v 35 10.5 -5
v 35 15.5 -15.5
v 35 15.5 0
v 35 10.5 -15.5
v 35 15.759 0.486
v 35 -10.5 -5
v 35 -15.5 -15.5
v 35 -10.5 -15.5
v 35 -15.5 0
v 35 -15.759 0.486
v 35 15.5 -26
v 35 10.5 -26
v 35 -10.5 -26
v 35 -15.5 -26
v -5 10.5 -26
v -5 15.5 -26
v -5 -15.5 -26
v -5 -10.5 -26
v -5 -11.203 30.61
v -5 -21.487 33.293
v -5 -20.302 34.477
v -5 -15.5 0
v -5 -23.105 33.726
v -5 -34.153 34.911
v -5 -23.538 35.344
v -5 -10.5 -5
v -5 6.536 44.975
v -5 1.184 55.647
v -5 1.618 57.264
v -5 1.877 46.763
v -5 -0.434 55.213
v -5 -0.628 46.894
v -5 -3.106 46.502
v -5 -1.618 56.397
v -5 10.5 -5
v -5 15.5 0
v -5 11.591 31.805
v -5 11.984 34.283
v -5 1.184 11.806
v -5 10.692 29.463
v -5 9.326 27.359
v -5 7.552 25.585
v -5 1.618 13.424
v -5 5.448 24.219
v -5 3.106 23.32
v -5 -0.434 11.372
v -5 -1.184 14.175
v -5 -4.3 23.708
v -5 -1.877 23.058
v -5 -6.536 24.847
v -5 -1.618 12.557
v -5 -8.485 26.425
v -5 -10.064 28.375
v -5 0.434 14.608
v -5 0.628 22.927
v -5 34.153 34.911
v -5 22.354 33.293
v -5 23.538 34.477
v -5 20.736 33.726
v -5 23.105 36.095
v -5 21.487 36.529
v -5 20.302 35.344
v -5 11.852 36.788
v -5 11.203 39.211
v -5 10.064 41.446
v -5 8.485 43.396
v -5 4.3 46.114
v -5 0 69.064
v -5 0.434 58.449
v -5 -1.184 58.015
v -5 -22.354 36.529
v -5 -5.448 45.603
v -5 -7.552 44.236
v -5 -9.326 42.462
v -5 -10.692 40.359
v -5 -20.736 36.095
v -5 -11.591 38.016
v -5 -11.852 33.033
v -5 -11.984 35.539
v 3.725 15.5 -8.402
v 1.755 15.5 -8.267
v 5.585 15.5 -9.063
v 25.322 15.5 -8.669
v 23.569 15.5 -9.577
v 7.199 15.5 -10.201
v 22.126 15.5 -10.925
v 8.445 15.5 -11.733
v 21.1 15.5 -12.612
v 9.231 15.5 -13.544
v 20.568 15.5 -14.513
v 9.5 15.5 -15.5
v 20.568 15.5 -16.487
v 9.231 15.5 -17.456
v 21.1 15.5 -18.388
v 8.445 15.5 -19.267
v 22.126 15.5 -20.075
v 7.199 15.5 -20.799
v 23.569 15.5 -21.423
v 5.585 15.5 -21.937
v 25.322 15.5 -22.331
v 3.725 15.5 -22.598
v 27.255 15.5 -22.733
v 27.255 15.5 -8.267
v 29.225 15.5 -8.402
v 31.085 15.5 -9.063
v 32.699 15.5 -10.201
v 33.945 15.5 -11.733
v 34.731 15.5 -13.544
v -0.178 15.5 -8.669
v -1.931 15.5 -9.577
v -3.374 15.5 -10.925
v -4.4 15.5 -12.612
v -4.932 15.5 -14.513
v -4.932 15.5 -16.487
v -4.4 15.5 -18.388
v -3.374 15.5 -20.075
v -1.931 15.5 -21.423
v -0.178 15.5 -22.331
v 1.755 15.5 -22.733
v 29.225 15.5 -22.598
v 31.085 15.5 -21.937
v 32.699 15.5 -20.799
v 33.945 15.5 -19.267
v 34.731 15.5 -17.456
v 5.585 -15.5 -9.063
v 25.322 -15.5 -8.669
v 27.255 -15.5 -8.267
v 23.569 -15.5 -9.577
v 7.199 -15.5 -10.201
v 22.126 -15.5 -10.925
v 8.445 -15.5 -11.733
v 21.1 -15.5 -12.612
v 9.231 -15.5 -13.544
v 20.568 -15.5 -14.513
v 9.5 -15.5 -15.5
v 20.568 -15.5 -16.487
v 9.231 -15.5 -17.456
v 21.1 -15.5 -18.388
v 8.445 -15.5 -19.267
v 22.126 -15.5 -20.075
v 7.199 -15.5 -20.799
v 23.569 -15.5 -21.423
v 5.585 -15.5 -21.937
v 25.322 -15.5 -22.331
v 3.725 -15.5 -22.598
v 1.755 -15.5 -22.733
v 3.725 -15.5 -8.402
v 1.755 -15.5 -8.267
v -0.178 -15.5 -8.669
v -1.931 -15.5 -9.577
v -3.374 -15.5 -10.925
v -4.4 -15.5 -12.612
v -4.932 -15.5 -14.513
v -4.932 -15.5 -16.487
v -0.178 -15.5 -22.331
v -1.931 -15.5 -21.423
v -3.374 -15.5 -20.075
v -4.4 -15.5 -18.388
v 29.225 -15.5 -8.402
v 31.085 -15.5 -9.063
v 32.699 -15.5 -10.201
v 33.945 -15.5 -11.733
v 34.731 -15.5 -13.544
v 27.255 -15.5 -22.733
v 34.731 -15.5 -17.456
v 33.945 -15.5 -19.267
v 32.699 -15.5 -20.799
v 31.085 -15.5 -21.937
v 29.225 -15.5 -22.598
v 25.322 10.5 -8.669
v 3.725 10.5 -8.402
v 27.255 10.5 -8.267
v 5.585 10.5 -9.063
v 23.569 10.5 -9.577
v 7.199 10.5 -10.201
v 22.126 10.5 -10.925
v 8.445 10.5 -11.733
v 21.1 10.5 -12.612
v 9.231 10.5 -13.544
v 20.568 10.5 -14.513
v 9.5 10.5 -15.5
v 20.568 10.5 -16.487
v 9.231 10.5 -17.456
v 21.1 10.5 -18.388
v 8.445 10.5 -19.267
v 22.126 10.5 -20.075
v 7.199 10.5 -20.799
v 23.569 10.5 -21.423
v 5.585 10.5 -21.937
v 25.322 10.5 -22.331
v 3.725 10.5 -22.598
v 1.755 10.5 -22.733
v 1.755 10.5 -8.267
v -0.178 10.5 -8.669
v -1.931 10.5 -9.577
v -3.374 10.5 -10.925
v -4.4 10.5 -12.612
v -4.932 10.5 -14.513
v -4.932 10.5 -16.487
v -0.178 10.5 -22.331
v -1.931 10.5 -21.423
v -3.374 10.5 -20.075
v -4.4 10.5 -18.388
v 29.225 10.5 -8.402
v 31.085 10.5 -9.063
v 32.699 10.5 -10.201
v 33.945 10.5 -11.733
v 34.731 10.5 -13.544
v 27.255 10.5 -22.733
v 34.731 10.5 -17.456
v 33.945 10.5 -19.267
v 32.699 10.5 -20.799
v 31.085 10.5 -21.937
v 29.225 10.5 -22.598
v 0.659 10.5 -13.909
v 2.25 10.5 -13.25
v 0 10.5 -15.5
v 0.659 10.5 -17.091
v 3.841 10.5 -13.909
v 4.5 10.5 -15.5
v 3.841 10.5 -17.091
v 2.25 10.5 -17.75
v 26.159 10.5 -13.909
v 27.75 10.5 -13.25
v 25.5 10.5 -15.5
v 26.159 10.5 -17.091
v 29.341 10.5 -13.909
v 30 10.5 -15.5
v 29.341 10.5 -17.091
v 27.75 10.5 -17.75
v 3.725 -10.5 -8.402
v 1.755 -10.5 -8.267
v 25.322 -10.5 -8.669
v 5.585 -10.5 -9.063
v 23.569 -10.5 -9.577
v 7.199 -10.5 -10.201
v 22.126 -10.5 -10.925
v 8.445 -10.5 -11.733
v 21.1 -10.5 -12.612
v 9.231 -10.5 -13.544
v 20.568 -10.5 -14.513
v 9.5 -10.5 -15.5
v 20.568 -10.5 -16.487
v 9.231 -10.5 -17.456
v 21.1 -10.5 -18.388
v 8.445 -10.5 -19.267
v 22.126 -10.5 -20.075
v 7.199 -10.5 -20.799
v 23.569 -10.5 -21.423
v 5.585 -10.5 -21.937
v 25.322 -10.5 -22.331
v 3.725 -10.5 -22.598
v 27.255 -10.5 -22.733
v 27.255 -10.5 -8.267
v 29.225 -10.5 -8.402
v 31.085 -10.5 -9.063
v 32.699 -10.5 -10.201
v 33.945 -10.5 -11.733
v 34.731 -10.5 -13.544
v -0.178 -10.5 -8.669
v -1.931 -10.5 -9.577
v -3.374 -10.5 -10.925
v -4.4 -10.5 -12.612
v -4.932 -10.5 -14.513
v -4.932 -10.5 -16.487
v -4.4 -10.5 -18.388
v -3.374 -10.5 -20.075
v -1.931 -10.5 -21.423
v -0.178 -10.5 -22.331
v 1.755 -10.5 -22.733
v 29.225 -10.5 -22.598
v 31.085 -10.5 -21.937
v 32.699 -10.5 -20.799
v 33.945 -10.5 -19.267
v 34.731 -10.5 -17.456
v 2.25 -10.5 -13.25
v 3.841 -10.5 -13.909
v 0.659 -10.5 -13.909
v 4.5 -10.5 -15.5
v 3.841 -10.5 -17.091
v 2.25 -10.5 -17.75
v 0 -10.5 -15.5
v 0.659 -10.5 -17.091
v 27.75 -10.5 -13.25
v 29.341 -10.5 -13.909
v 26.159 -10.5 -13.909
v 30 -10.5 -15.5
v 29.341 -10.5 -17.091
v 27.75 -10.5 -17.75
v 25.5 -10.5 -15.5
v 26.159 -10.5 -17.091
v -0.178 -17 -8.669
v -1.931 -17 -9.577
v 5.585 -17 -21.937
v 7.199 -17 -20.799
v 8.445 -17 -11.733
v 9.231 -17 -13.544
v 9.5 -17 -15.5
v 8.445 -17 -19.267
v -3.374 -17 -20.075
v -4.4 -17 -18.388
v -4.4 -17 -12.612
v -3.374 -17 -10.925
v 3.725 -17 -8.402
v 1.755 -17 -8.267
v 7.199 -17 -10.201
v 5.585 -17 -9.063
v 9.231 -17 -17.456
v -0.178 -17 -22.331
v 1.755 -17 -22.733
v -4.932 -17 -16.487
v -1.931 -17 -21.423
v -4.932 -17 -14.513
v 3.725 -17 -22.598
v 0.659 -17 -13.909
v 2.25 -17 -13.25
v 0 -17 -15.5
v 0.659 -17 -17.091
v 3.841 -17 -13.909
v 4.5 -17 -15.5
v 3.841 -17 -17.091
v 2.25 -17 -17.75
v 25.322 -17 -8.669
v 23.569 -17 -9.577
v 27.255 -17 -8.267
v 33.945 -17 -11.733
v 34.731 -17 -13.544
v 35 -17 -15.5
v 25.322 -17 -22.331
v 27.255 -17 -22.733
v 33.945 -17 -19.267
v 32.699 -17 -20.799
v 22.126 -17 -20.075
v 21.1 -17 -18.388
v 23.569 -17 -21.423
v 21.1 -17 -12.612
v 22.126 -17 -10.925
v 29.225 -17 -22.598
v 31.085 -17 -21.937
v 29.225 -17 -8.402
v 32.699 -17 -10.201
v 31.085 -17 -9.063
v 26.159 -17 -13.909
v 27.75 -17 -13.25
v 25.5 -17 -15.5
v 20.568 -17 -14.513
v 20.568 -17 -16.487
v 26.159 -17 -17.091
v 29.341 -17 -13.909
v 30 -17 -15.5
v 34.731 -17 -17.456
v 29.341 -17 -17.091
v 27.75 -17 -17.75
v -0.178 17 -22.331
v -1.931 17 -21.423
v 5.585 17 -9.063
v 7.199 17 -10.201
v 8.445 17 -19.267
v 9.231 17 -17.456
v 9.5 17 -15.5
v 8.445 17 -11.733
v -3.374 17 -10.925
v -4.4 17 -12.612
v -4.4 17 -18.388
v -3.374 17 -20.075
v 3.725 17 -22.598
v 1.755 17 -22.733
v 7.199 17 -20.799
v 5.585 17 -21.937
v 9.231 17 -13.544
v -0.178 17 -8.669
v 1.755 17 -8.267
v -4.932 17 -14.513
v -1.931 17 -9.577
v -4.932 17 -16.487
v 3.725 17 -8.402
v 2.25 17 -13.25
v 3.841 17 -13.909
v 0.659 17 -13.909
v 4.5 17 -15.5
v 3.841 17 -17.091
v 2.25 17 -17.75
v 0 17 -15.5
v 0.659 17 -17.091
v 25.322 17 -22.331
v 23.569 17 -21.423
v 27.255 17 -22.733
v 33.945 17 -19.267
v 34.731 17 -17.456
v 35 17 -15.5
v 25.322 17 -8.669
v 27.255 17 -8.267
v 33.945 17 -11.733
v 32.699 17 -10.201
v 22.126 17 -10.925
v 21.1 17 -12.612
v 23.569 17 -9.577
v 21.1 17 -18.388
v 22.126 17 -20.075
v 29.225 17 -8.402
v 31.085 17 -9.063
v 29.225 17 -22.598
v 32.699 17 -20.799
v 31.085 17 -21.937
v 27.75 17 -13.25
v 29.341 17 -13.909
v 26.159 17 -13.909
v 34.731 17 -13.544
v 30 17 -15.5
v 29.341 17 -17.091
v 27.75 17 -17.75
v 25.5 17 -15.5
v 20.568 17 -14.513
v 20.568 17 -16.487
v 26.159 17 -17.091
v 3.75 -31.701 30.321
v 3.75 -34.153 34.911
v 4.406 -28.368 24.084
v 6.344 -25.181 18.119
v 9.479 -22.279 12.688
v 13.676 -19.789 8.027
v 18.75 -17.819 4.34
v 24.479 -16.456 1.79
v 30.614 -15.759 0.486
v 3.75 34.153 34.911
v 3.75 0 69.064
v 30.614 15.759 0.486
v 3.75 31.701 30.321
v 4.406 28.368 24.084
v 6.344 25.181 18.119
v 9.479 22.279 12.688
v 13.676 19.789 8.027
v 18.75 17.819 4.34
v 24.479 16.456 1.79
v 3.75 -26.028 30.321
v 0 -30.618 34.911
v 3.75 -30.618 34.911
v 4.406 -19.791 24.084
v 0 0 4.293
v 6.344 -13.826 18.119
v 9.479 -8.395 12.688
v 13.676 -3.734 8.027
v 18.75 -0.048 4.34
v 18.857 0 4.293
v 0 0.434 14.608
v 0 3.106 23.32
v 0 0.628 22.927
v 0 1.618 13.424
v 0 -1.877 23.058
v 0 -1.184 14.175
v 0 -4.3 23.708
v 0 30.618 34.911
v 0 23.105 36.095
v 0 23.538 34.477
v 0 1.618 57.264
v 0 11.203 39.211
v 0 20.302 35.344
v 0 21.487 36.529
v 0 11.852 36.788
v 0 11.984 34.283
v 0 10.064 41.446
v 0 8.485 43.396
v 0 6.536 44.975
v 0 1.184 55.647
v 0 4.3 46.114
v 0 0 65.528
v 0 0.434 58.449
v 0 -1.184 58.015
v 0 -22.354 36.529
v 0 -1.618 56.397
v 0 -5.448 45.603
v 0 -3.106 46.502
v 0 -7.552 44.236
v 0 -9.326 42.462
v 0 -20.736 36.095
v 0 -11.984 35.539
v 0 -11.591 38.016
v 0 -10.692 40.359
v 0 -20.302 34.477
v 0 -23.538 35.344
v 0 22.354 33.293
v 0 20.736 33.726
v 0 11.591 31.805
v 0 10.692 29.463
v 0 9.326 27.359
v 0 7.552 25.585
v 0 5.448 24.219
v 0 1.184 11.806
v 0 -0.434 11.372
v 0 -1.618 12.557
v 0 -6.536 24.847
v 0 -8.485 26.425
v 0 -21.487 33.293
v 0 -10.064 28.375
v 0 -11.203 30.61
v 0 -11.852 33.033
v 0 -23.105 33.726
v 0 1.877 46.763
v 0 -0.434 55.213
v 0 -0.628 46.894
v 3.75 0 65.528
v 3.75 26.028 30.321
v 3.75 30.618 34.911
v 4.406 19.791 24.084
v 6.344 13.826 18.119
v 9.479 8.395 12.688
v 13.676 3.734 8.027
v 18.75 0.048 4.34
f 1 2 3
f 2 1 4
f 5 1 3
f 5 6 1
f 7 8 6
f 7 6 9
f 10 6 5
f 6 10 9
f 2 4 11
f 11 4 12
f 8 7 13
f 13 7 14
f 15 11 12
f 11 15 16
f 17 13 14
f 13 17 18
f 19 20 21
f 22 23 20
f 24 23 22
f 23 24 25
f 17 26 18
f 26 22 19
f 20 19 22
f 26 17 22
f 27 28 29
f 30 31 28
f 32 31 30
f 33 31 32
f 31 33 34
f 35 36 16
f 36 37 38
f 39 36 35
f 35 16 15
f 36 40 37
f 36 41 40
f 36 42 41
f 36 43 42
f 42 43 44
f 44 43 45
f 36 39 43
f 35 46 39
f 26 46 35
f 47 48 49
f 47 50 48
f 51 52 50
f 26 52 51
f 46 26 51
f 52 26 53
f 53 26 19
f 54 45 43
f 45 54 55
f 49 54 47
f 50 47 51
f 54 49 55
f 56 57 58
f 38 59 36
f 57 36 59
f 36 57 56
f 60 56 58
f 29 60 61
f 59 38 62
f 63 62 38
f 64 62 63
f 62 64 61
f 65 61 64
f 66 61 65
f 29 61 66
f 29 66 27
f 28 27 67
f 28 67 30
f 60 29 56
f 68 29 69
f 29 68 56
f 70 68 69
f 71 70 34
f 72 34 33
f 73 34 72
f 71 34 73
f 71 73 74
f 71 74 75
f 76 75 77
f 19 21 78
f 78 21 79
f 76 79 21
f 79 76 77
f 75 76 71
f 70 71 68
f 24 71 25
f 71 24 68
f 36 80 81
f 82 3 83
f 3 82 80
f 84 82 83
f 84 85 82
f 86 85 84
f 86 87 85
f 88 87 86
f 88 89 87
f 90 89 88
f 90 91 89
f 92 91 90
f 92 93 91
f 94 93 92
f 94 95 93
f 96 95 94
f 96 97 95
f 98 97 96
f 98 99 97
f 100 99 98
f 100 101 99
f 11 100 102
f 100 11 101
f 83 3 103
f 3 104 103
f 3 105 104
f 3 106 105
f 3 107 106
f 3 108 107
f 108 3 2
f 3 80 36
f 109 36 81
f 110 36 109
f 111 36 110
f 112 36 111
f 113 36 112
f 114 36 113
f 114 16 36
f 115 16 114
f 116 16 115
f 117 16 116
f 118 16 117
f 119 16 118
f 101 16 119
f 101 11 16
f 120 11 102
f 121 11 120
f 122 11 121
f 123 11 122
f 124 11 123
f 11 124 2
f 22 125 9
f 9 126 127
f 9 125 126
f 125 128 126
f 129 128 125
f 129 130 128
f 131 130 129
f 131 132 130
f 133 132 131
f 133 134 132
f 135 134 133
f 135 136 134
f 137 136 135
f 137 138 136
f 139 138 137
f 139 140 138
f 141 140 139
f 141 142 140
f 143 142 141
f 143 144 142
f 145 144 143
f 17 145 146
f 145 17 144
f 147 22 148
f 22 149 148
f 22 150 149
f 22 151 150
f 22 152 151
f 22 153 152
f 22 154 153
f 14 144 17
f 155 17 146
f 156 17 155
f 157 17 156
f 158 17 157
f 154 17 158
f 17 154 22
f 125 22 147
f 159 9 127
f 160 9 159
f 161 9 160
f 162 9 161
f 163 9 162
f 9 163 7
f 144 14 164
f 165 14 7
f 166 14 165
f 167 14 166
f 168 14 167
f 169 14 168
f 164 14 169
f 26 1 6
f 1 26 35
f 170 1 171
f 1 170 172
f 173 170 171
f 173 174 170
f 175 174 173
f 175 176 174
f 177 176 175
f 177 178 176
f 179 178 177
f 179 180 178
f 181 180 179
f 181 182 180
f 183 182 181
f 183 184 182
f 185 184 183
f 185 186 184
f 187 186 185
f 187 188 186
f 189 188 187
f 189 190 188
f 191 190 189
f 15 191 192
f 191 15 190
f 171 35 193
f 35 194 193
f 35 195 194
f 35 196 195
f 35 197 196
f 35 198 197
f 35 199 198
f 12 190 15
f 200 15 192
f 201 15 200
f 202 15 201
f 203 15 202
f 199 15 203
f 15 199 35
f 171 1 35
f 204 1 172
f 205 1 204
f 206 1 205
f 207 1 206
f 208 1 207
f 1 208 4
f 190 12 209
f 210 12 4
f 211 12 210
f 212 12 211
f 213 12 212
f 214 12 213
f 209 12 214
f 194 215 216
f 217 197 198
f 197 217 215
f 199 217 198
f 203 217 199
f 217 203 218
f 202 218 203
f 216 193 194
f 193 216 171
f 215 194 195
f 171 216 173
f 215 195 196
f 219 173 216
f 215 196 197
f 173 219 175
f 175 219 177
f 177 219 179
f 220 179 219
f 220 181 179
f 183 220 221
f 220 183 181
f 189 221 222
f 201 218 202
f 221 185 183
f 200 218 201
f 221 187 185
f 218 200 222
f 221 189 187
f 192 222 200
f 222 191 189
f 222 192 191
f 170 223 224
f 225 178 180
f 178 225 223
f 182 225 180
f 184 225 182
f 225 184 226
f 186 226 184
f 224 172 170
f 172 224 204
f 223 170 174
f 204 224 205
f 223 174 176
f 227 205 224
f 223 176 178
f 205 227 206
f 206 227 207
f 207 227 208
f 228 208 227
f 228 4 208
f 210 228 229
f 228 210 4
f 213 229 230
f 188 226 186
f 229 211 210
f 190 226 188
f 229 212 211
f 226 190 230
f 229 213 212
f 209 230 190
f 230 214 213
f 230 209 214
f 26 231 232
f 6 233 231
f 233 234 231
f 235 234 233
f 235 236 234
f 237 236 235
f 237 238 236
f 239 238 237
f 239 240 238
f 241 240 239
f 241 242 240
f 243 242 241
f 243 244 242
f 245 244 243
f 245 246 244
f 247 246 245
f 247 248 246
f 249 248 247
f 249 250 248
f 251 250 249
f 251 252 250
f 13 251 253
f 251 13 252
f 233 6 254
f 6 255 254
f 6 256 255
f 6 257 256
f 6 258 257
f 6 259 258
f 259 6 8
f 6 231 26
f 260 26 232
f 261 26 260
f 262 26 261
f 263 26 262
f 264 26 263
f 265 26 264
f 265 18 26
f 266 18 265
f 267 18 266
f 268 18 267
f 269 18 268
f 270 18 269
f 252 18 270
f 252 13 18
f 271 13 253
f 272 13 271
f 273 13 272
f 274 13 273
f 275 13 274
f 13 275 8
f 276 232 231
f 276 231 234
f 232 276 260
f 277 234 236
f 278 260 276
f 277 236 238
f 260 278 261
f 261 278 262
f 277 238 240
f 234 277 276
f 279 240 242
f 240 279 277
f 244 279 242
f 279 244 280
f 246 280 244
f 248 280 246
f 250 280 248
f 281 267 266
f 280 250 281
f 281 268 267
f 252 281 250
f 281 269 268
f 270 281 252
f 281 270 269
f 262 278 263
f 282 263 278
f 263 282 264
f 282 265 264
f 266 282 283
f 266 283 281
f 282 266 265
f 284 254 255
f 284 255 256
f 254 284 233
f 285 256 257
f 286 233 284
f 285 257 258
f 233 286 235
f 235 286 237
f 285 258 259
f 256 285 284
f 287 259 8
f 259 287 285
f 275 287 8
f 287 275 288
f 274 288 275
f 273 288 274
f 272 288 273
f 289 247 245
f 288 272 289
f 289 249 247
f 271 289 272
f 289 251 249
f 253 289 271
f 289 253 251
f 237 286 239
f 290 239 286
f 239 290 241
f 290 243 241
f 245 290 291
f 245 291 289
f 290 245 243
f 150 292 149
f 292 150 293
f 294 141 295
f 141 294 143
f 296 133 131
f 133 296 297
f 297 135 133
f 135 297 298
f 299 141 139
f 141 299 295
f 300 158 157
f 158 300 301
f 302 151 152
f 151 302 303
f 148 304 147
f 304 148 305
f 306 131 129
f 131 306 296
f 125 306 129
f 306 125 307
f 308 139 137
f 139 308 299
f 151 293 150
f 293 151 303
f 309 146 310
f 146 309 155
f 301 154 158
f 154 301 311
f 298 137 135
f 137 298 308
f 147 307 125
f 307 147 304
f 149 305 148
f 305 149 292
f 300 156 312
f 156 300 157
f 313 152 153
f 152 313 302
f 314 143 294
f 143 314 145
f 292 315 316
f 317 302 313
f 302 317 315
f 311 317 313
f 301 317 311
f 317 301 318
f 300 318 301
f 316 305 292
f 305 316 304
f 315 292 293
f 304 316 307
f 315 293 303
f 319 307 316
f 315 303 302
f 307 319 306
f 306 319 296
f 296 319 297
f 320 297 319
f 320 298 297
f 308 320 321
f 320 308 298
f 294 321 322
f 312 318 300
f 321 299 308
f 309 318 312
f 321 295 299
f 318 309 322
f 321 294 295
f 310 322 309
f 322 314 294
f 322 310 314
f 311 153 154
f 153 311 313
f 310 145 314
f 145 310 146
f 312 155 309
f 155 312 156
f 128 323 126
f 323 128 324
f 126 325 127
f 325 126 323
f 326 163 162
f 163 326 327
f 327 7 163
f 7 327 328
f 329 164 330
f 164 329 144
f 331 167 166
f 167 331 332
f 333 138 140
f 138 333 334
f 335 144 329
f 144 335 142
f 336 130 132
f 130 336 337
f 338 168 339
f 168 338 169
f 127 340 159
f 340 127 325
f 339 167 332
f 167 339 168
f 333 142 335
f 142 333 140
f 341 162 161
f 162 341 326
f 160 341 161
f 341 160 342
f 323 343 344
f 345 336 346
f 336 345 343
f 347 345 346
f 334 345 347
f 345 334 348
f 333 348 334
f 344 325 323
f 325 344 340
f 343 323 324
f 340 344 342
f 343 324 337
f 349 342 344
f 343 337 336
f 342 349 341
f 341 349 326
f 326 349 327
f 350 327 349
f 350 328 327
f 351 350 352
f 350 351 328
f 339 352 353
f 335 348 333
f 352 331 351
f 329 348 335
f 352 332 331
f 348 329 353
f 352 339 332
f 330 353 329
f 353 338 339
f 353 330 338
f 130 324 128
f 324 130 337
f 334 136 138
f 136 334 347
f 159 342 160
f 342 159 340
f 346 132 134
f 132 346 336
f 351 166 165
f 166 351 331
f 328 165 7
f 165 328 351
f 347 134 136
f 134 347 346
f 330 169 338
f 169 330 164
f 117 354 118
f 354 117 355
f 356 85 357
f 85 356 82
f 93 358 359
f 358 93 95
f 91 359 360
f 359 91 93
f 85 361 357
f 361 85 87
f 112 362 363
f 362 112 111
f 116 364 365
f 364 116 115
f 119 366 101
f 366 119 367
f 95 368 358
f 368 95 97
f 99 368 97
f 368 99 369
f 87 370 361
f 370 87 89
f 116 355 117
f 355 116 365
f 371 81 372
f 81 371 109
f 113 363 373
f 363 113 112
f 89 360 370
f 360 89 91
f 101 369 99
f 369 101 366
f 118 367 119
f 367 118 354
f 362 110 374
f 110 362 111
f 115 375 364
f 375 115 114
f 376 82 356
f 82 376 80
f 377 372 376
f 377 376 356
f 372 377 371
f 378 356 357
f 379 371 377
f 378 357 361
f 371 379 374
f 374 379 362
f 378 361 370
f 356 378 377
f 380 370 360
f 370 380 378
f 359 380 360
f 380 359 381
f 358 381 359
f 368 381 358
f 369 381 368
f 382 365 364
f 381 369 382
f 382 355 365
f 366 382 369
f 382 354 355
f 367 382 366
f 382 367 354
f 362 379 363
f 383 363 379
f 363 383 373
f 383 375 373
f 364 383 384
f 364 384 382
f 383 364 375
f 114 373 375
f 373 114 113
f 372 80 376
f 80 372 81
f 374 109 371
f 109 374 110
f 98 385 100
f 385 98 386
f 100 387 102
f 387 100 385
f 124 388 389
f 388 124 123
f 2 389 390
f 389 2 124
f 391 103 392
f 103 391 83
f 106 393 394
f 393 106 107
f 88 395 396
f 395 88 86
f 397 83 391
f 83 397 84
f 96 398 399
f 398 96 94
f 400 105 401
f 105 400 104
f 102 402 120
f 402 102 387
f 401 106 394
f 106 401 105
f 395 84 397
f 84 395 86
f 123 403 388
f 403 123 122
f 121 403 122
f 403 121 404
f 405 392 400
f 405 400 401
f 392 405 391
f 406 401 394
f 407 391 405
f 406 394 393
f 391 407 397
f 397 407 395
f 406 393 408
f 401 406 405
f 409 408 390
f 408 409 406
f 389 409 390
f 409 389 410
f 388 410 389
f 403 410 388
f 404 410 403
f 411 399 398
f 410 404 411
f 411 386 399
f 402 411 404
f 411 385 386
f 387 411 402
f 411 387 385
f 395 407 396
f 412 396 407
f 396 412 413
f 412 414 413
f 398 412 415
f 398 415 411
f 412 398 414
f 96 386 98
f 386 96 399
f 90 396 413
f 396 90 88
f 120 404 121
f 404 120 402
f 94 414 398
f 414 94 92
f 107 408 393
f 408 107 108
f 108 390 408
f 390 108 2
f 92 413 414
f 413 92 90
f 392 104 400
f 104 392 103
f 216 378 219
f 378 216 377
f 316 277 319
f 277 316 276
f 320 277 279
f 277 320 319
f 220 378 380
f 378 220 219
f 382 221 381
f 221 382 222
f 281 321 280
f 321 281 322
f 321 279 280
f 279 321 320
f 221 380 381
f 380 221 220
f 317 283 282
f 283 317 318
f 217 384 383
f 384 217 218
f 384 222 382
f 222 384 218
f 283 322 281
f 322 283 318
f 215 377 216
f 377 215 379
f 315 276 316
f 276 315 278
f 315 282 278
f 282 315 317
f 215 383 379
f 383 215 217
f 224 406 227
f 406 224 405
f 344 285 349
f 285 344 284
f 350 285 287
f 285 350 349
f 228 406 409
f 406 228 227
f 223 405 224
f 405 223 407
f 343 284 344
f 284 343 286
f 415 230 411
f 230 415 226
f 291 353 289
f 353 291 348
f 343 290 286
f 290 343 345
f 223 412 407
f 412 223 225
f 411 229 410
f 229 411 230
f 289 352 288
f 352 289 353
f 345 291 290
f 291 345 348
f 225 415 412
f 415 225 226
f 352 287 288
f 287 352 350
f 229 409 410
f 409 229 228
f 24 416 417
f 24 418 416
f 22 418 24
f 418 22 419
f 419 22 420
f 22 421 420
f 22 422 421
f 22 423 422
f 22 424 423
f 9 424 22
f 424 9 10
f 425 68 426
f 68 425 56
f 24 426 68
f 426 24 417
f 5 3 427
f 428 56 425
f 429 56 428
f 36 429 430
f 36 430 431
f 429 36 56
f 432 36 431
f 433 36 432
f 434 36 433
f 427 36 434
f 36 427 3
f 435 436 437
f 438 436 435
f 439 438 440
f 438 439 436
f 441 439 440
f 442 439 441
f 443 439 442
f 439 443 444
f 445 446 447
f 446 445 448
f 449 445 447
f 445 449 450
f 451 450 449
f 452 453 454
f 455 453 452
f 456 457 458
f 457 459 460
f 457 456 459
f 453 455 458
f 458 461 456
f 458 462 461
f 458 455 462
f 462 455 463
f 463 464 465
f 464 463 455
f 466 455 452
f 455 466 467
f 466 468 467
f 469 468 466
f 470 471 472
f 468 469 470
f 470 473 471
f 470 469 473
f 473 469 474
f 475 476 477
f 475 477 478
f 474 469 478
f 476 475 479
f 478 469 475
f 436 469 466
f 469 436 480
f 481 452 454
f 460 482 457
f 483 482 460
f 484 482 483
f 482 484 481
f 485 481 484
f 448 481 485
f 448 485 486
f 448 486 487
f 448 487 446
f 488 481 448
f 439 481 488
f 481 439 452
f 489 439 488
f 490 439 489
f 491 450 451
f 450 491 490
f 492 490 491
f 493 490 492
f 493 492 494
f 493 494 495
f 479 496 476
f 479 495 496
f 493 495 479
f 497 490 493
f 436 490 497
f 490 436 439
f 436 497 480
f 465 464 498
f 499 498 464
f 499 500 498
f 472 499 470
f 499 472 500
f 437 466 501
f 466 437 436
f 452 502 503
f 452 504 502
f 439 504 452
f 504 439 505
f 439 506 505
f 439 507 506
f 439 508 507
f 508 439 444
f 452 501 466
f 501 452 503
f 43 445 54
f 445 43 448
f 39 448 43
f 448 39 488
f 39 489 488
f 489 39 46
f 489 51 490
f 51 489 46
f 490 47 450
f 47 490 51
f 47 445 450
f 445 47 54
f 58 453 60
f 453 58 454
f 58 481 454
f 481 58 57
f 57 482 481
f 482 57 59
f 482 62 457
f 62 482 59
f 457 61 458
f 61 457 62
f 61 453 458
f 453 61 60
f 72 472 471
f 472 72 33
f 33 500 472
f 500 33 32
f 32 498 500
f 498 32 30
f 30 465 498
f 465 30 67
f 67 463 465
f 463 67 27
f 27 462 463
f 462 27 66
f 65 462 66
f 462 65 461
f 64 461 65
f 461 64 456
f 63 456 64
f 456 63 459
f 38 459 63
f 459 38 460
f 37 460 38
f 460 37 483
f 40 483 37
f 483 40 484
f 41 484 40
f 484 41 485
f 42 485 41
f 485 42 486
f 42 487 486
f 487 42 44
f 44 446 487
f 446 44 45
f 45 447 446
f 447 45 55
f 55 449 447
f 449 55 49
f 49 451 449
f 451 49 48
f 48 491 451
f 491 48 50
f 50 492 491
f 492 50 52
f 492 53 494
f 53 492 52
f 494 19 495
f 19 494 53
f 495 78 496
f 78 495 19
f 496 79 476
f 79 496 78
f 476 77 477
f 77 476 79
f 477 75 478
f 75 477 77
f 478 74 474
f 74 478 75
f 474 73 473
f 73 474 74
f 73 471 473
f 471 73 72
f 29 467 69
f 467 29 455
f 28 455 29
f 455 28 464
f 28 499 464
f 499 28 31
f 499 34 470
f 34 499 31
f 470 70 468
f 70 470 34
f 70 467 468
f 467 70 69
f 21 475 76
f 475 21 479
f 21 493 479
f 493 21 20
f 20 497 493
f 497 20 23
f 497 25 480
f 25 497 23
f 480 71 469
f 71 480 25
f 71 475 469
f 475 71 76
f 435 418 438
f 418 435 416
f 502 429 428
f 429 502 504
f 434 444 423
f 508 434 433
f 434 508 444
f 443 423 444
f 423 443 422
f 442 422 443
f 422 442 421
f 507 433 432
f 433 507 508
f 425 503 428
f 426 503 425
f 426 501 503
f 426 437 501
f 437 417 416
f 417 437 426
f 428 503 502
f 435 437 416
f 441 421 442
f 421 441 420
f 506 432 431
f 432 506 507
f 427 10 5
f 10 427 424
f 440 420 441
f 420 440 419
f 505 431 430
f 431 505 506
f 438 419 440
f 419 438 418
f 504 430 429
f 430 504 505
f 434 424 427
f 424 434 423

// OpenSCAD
lonNEMA=42.3;

module agujerosNEMA(){
    
    //agujero central
    circle(d=22+1+1);
    
    //agujeros montaje  
    for(v=[0:3]){
      rotate(90*v)
      //translate([16,16])
        translate([15.5,15.5])
      circle(d=3.1+0.25);
    }
    
}

 module monturaExtrusor(){
    tol=1;
    diamTorBal=4.6;
    distBalerosX=40;
    //lonNEMA=42.3;
    distEntreTorY=lonNEMA+24+(tol*2);
    diamTorProf=5.8;
    minkow=7;
    alturaPoste=8.3;
    espesor=5;//espesor 6
    calcePerfil=3.67;
    diamTuerca=10.58;
    altTuerca=3.5;

    esp=3.75;
    altPil=16;
    disXP=24.75;
    offNema=35;
    
    tolM4=0.5;//antes 0.25
    minkBase=10;
    alturaNema=40+1.3;
            
    perfil=20;
     canal=6;
     ajEsX=4;
     diamT=7;

     angulo=90;
     ajNema=5;
     ajNemaY=6;
     
      lon20=20;
  
     rec45=sqrt(pow(lonNEMA/2,2)+pow(lonNEMA/2,2));


    //23 mm referido a la altura del motor nema hacia el perfil
     
    //apoyo tornillos a perfil
    //translate([-lon20/2,0,-lon20/2])
    //rotate([0,-90,0])
    difference(){
     
        diamPostes=4+tolM4+(espesor*2);
        
         lonY_c=lon20+(espesor*2)+tol;
         lonX_c=lon20*2;
         lonZ_c=lon20+tol+espesor;
               union(){
                   
                     //postes para tornillos
                   
      //cubo para tornillos
                    //translate([-espesor,-espesor-(lon20/2),-lon20])
                   // cube([lon20*3,espesor,lon20]);
                
               translate([(lonX_c/2)-espesor,0,-lonZ_c/2])
                difference(){   
                   cube([lonX_c,lonY_c,lonZ_c],center=true);
                    translate([0,0,-espesor/2])
                   cube([lonX_c*2,lonY_c-(espesor*2),lonZ_c-espesor],center=true);
                }
                
                  //postes tronillos M4 con 2mm extra
                
              
                  
                 for(g=[0:1]){
                    translate([0,0,g*2*(-(tol/2)-espesor-(lon20/2))])
                   rotate([180*g,0,0])
                   translate([-espesor+(diamPostes/2),-(lon20/2)-(tol/2),(-(tol/2)-espesor-(lon20/2))])
                   
                    for(u=[0:1]){
                      translate([(lonX_c-diamPostes)*u,0,0])
                        rotate([90,0,0])
                      cylinder(d=diamPostes,h=espesor+1.5); 
                    }//for u
                  }//for g
                  
                  
                }
                 //taladros postes tronillos m4
                 translate([-espesor+(diamPostes/2),0,(-(tol/2)-espesor-(lon20/2))])
                for(u=[0:1]){
                  translate([(lonX_c-diamPostes)*u,0,0])
                  rotate([90,0,0])
                  cylinder(d=4+tolM4,h=1000,center=        true); 
                }
                
            }
          
            exAncho=(lon20*2)-espesor;
            
            despX=0;//desplazamiento de apoyoNEMA en X
            despZ=5;
            difference(){    
         hull(){
                //union apoyo nema con apoyo perfil 20 (tam espesor)
             rotate([0,0,180]) 
             translate([0,0,0])    
             translate([despX-exAncho,-(lon20+(2*espesor)+tol)/2,0])    
             cube([espesor+exAncho,lon20+(2*espesor)+tol,espesor]);
                    
                //23 mm referido a la altura del motor nema hacia el perfil
             translate([-(espesor/2)-despX+(exAncho/2),0,rec45+despZ])
             rotate([0,-90,0])
             rotate([0,0,45])
             cube([lonNEMA+tol+(espesor),lonNEMA+tol+(espesor),espesor+exAncho],center=true);
         }
         
         //recorte motor NEMA
          translate([500-espesor,0,rec45+despZ])
      rotate([0,-90,0])
      rotate([0,0,45]) 
      translate([0,0,-espesor])
         cube([lonNEMA+tol,lonNEMA+tol,1000],center=true);
         
         //agujeros NEMA
      translate([500,0,rec45+despZ])
      rotate([0,-90,0])
      rotate([0,0,45]) 
      translate([0,0,-espesor])
      linear_extrude(height=1000)
      agujerosNEMA();  
         
         translate([(lon20*2)-espesor,0,(rec45*2)+(espesor*1.5)+despZ])
         
         minkowski(){
             cube([espesor/2,1000,84],center=true);
             rotate([90,0,0])
            cylinder(r=30,h=0.01,center=true);
         }
          
     }
 
 }//fin modulo
 
 
 
 //chaflan de 1mm para los apoyos de los tornillos
 //fillet de 5mm para las orillas
 //fillet de 3mm para las orillas
monturaExtrusor();
